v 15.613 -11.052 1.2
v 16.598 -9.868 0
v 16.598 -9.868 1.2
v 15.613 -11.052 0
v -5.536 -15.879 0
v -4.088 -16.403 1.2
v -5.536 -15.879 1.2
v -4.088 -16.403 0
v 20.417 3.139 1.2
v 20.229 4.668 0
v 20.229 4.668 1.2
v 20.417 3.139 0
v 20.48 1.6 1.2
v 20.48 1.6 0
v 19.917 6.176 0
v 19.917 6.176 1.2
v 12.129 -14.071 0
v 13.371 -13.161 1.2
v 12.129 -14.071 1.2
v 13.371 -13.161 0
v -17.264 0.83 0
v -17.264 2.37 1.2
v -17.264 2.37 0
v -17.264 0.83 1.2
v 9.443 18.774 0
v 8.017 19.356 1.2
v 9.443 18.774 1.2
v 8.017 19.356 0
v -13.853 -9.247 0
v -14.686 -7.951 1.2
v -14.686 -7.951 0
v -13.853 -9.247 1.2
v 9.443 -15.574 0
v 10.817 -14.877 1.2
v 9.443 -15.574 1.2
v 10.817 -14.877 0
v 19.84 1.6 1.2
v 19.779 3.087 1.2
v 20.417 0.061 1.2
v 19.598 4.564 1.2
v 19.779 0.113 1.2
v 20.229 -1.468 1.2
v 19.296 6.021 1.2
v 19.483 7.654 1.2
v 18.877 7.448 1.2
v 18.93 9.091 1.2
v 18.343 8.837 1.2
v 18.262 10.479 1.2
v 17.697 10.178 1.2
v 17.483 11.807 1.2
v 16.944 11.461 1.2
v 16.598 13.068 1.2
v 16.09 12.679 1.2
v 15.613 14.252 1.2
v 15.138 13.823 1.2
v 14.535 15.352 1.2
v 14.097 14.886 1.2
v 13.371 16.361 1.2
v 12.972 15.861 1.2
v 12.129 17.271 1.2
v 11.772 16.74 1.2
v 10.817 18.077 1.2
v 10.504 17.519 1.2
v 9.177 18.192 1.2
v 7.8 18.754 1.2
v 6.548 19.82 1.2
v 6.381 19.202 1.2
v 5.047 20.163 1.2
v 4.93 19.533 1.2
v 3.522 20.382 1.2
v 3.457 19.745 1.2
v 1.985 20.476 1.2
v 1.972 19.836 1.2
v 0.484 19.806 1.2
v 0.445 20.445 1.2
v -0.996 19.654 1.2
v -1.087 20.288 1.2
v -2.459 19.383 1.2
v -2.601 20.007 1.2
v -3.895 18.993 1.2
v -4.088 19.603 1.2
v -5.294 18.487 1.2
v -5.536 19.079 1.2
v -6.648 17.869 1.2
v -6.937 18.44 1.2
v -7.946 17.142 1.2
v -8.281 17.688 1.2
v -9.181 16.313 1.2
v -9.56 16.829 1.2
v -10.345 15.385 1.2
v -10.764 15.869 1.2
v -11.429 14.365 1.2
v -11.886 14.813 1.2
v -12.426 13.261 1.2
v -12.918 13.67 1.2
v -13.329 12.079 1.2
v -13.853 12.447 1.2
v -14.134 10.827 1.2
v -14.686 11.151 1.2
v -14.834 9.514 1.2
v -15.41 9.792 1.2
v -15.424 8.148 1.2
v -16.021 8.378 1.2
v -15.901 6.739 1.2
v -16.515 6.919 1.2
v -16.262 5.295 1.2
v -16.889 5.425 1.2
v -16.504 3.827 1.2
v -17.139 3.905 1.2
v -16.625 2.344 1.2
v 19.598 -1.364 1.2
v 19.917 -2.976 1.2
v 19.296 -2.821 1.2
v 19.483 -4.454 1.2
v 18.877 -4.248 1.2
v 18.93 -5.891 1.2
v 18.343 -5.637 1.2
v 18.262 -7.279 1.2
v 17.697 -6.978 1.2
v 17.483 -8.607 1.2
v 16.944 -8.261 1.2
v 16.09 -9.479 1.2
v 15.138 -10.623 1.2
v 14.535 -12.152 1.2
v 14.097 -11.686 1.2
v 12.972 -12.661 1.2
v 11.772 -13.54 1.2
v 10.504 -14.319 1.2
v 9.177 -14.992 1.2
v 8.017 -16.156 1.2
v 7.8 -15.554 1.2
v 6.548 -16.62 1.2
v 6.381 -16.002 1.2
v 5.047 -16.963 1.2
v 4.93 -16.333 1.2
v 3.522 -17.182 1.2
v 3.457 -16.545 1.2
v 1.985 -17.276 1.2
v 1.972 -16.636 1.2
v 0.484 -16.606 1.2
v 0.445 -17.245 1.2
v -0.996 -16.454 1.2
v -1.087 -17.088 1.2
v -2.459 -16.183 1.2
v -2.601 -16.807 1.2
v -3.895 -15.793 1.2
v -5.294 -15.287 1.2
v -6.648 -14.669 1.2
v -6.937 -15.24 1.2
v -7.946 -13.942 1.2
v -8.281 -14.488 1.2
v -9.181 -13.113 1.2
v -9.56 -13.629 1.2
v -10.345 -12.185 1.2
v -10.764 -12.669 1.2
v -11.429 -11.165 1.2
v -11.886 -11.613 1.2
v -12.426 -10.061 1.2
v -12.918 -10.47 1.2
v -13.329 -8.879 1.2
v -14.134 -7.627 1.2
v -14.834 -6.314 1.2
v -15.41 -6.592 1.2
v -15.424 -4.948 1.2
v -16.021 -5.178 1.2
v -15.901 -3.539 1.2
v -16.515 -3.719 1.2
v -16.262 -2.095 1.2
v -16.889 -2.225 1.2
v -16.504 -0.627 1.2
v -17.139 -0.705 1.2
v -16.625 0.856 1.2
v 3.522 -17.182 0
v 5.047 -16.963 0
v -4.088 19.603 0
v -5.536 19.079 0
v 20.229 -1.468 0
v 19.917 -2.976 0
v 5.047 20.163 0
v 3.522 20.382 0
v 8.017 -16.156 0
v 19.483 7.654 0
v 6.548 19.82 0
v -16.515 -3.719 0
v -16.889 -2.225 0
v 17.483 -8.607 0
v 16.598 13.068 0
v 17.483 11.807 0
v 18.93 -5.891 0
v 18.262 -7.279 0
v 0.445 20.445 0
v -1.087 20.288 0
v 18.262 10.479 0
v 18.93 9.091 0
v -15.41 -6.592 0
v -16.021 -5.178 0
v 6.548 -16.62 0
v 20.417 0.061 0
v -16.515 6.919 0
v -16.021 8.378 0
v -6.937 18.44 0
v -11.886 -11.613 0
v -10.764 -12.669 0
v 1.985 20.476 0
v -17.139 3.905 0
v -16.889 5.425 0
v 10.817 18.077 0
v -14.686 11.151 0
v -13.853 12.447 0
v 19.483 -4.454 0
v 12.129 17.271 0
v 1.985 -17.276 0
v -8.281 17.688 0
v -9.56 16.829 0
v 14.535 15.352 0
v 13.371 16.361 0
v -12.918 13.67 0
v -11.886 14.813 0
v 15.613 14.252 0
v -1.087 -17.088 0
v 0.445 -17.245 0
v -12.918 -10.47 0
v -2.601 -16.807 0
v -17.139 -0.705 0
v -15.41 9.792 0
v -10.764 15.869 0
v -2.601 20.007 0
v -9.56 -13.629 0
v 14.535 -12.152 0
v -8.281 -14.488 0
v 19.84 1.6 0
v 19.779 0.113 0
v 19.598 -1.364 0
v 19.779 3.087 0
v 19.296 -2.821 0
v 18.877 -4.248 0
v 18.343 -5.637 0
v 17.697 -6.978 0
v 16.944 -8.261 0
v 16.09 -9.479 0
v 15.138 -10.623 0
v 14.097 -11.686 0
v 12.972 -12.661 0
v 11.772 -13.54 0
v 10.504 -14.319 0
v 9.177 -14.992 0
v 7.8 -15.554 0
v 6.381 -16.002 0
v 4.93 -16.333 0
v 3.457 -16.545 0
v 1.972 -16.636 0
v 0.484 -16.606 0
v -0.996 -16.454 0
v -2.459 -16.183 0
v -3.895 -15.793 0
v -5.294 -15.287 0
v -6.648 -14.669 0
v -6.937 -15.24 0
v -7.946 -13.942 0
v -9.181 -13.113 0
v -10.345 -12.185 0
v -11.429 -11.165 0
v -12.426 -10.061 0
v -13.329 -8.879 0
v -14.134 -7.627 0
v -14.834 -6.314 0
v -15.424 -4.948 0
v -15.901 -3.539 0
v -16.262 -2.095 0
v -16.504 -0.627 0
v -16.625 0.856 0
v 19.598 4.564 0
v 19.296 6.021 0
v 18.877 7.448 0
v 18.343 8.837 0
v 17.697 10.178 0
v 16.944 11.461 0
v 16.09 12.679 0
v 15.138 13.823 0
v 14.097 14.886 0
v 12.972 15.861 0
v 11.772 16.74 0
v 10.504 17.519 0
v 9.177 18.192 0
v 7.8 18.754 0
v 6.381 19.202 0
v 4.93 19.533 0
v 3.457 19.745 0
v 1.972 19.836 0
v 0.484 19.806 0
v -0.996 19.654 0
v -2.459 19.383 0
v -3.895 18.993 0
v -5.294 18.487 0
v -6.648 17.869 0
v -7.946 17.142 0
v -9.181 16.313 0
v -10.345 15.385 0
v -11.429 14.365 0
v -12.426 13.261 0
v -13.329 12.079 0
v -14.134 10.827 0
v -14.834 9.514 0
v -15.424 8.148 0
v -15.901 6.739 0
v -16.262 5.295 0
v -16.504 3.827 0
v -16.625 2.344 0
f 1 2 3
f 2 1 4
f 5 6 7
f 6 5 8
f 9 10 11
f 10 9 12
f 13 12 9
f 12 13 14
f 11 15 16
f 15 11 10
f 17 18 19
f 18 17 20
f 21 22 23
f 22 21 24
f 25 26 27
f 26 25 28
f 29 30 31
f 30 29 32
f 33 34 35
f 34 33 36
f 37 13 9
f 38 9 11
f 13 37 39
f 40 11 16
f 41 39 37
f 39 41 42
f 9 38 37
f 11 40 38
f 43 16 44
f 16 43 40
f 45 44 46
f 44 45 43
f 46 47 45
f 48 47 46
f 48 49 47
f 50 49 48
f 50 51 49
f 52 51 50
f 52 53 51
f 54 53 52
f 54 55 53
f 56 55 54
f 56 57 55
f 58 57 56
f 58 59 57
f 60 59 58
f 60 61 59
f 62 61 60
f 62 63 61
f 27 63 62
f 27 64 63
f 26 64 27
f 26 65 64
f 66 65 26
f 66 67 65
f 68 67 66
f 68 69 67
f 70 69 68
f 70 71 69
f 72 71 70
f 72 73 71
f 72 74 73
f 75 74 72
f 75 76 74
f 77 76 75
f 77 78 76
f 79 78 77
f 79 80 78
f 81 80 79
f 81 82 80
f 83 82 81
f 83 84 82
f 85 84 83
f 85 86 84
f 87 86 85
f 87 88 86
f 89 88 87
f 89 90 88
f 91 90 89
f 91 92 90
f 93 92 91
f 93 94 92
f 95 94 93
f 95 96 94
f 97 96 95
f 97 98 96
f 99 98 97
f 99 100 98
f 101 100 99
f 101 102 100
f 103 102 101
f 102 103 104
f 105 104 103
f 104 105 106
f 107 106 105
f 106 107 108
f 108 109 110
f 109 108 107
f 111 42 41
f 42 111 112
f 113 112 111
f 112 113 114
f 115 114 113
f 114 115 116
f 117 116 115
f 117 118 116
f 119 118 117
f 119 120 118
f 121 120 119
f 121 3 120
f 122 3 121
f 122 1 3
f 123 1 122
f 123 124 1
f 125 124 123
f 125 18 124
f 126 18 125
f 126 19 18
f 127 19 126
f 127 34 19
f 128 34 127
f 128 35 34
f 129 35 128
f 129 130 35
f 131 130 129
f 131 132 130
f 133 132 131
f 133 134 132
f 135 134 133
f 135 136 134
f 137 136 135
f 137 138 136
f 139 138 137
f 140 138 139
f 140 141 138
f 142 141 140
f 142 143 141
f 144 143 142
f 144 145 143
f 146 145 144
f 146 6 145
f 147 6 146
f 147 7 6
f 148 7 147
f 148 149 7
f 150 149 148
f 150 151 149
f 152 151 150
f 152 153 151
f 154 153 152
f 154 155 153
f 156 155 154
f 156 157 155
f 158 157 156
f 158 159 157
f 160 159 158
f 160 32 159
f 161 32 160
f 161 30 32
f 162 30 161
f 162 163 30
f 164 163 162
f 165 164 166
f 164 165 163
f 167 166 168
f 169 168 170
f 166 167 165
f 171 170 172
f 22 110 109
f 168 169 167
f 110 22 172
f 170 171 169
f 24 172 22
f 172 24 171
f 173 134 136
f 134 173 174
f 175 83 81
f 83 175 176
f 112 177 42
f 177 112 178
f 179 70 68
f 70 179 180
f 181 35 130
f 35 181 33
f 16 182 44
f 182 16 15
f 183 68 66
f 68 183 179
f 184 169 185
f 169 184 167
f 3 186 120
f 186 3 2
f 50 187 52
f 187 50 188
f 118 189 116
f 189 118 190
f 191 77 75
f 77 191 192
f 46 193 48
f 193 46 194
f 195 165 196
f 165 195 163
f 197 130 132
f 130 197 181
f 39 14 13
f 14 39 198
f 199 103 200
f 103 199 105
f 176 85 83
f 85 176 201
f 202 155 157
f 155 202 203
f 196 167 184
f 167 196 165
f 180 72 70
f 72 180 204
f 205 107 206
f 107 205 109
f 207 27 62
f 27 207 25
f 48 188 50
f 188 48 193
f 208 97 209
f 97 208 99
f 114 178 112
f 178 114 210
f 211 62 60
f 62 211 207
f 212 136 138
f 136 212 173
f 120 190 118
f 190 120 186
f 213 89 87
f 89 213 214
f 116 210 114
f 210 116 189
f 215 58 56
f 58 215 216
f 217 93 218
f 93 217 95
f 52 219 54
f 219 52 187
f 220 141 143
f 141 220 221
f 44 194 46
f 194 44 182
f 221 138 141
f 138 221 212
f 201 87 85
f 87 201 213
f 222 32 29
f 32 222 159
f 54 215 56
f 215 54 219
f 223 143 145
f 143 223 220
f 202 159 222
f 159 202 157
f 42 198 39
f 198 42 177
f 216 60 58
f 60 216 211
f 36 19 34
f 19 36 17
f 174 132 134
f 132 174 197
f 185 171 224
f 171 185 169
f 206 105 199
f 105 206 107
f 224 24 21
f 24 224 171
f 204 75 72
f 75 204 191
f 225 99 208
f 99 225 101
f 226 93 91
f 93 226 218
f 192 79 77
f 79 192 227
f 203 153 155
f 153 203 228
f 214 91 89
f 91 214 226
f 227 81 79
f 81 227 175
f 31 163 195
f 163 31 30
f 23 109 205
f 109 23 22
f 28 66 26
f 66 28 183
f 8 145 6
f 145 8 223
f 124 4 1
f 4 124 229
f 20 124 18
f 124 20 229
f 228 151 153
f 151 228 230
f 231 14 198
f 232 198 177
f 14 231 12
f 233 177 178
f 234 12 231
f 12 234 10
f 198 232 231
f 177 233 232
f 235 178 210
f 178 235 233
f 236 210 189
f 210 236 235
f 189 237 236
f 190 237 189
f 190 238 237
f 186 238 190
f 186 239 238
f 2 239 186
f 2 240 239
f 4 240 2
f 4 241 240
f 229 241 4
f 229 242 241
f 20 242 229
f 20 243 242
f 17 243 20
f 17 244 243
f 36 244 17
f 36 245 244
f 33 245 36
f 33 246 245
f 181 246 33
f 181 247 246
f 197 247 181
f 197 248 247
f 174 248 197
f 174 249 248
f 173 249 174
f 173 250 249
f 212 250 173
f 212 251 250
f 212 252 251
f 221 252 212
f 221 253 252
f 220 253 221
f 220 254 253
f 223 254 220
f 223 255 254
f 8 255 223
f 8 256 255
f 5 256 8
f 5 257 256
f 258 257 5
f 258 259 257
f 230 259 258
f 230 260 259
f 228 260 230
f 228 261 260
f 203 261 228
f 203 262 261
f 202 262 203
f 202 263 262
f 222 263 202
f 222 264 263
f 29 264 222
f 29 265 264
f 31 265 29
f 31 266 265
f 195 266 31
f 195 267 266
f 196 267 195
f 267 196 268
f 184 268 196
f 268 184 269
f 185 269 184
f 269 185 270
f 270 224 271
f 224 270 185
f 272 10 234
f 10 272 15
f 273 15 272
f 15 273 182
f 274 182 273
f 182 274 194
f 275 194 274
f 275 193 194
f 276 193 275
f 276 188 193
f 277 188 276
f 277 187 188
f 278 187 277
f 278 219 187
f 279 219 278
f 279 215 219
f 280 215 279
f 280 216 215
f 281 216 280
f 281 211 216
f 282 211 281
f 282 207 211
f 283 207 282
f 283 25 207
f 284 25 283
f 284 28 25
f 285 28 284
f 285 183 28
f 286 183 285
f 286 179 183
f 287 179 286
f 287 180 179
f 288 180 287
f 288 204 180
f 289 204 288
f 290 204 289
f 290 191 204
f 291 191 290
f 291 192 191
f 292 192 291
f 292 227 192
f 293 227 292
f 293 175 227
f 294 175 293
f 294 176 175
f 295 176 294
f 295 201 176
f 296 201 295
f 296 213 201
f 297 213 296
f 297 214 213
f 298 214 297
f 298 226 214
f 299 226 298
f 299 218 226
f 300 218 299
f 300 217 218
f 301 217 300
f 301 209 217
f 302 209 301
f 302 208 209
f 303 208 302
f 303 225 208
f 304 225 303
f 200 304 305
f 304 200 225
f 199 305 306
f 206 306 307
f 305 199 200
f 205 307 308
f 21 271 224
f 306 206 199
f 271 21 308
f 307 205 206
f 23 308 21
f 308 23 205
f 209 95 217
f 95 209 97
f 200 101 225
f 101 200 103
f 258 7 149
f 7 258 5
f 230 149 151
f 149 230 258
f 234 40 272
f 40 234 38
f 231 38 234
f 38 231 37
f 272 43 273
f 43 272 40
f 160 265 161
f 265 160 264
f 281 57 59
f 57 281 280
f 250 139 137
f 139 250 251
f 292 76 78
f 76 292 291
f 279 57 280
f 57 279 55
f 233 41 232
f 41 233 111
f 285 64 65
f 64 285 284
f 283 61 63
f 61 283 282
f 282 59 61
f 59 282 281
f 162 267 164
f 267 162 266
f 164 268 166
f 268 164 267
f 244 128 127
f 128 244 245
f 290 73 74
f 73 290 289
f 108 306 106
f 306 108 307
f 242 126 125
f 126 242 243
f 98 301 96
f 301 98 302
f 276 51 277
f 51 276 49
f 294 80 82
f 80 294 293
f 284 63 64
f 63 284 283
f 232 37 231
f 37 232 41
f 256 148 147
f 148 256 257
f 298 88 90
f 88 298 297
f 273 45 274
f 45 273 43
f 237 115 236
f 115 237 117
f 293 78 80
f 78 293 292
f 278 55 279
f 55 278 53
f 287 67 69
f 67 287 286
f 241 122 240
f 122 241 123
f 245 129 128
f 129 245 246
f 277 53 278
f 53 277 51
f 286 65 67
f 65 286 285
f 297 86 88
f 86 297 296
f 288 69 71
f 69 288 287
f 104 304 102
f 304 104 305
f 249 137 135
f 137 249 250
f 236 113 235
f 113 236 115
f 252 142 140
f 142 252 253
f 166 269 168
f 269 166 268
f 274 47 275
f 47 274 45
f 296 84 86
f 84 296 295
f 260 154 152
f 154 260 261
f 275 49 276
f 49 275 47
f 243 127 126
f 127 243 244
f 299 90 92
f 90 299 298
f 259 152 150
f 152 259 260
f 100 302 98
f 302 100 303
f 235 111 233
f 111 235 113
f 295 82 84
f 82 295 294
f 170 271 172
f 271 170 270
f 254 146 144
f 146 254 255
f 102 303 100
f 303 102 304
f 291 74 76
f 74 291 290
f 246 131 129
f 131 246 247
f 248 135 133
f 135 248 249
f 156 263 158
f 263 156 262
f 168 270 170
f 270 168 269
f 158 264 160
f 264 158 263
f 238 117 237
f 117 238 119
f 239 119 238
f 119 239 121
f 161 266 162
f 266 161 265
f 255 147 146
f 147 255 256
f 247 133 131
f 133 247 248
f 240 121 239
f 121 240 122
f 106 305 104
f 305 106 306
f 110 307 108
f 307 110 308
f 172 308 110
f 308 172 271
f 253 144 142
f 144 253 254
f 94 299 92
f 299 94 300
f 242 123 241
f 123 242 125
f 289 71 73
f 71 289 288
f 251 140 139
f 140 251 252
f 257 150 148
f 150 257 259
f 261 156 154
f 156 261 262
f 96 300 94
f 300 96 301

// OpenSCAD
// file: Tull2.scad
module Tull2_1()
{
 /* Generated by trace2scad version 20150415
    http://aggregate.org/MAKE/TRACE2SCAD/
    Optimized model has 507/1073 original points
 */
 color([0.5, 0.5, 0.5])
 assign(minx=0) /* polygon minx=774 */
 assign(miny=0) /* polygon miny=345 */
 assign(maxx=8590) /* polygon maxx=8136 */
 assign(maxy=8550) /* polygon maxy=4995 */
 assign(dx=maxx-minx)
 assign(dy=maxy-miny)
 assign(maxd=((dx>dy)?dx:dy))
 scale([1/maxd, 1/maxd, 1])
 translate([-minx-dx/2, -miny-dy/2, 0])
 linear_extrude(height=1, convexity=507)
 union() {
  union() {
   polygon([[7190,4966],[7190,4938],[7199,4823],[7206,4806],[7233,4795],[7633,4703],[7647,4690],[7637,4674],[7282,4489],[7241,4469],[7236,4457],[7250,4340],[7256,4283],[7261,4275],[7888,4625],[7914,4625],[7957,4610],[7981,4588],[7996,4559],[8013,4458],[8058,4459],[8133,4468],[8136,4518],[8119,4628],[8094,4689],[8043,4741],[7963,4779],[7197,4995],[7190,4995]], convexity=9);
   union() {
    difference() {
     polygon([[7560,4212],[7523,4205],[7448,4179],[7398,4146],[7295,4043],[7270,4008],[7251,3957],[7235,3880],[7235,3793],[7245,3728],[7280,3653],[7326,3598],[7378,3559],[7440,3529],[7513,3509],[7634,3504],[7688,3516],[7768,3556],[7833,3624],[7874,3703],[7896,3768],[7911,3843],[7919,3993],[7901,4103],[7885,4153],[7858,4208],[7823,4211],[7720,4199],[7720,4191],[7765,4112],[7790,4013],[7785,3871],[7770,3810],[7750,3765],[7709,3720],[7657,3701],[7612,3694],[7595,3711],[7625,4103],[7630,4158],[7630,4220],[7598,4219]], convexity=12);
     polygon([[7525,3998],[7530,3991],[7485,3743],[7471,3729],[7447,3735],[7406,3764],[7380,3798],[7365,3860],[7376,3922],[7394,3958],[7428,3990],[7468,4004],[7519,4005]], convexity=6);
    }
   }
   polygon([[1434,4182],[1400,4175],[1330,4139],[1277,4086],[1245,4020],[1230,3972],[1216,3893],[1205,3743],[1195,3658],[1180,3611],[1144,3575],[1094,3559],[1053,3566],[1012,3589],[985,3628],[966,3673],[950,3763],[950,3908],[960,3978],[989,4092],[991,4106],[948,4102],[813,4079],[795,4062],[785,3993],[774,3828],[786,3688],[817,3553],[861,3449],[921,3355],[978,3303],[1038,3273],[1124,3269],[1181,3281],[1278,3329],[1333,3385],[1379,3468],[1401,3533],[1410,3583],[1420,3668],[1430,3853],[1450,3919],[1477,3951],[1510,3965],[1572,3965],[1613,3941],[1635,3911],[1661,3853],[1675,3758],[1674,3633],[1659,3540],[1674,3540],[1788,3581],[1828,3591],[1843,3599],[1848,3678],[1840,3825],[1814,3951],[1784,4031],[1735,4105],[1684,4149],[1628,4177],[1578,4190],[1468,4189]], convexity=13);
   polygon([[7179,3501],[7176,3498],[7144,3302],[7306,3057],[7320,3036],[7320,3029],[7298,3036],[7258,3055],[7241,3055],[7234,3065],[7213,3065],[7158,3084],[7113,3097],[7046,3130],[7026,3134],[6995,3150],[6975,3150],[6935,3170],[6887,3170],[6839,3146],[6809,3118],[6780,3060],[6780,3019],[6806,2973],[6836,2941],[6965,2875],[6995,2875],[7048,2848],[7061,2851],[7079,2834],[7123,2829],[7160,2810],[7189,2810],[7266,2770],[7298,2770],[7370,2735],[7399,2735],[7438,2716],[7478,2699],[7590,2634],[7603,2639],[7705,2889],[7705,2909],[7640,2928],[7593,2941],[7513,2969],[7469,2981],[7463,2997],[7474,3000],[7779,3200],[7786,3253],[7815,3412],[7806,3421],[7448,3180],[7419,3164],[7404,3177],[7196,3493],[7181,3505]], convexity=23);
   polygon([[1617,3321],[1576,3303],[1530,3284],[1525,3266],[1543,3228],[1562,3175],[1552,3158],[1528,3145],[1225,3014],[1150,2964],[1114,2923],[1094,2880],[1089,2811],[1106,2738],[1189,2534],[1206,2509],[1223,2514],[1338,2561],[1356,2578],[1305,2706],[1299,2763],[1319,2794],[1366,2821],[1434,2849],[1637,2940],[1664,2940],[1673,2928],[1761,2720],[1778,2720],[1911,2777],[1916,2790],[1830,2995],[1830,3019],[1851,3034],[1998,3096],[2016,3112],[2010,3142],[1938,3303],[1929,3315],[1912,3315],[1763,3249],[1738,3240],[1717,3254],[1679,3340],[1658,3339]], convexity=17);
   polygon([[6946,2688],[6920,2680],[6888,2664],[6832,2608],[6788,2520],[6784,2419],[6802,2340],[6791,2329],[6720,2365],[6707,2346],[6638,2200],[6653,2186],[7189,1890],[7201,1890],[7280,2056],[7280,2069],[7248,2089],[7033,2201],[6963,2242],[6911,2290],[6884,2352],[6889,2409],[6918,2462],[6963,2491],[7023,2487],[7133,2431],[7383,2292],[7398,2286],[7409,2293],[7491,2440],[7488,2456],[7198,2620],[7092,2674],[7040,2689],[6973,2695]], convexity=14);
   union() {
    difference() {
     polygon([[1790,2582],[1778,2579],[1688,2554],[1628,2524],[1547,2470],[1482,2402],[1451,2348],[1425,2269],[1425,2166],[1440,2093],[1467,2023],[1506,1948],[1550,1881],[1622,1804],[1738,1717],[1799,1680],[1821,1680],[1929,1758],[1935,1771],[1929,1780],[1870,1810],[1768,1876],[1689,1953],[1646,2018],[1619,2078],[1614,2170],[1645,2234],[1686,2271],[1703,2268],[1780,2163],[2033,1808],[2049,1798],[2098,1832],[2162,1887],[2215,1952],[2254,2033],[2271,2106],[2264,2192],[2255,2242],[2230,2305],[2208,2343],[2148,2428],[2068,2508],[1998,2549],[1938,2571],[1858,2585],[1803,2584]], convexity=11);
     polygon([[1983,2355],[2015,2340],[2059,2289],[2081,2244],[2082,2158],[2055,2106],[2024,2080],[2006,2080],[1825,2333],[1825,2349],[1839,2360],[1878,2375],[1951,2371]], convexity=7);
    }
   }
   union() {
    difference() {
     polygon([[6588,1945],[6563,1941],[6484,1909],[6409,1848],[6335,1753],[6296,1673],[6280,1613],[6274,1523],[6291,1458],[6332,1383],[6428,1287],[6500,1244],[6578,1219],[6668,1219],[6727,1240],[6773,1267],[6828,1309],[6896,1381],[6941,1450],[6970,1513],[6991,1596],[6987,1703],[6946,1788],[6889,1850],[6801,1909],[6722,1940],[6658,1950],[6613,1949]], convexity=7);
     polygon([[6651,1748],[6683,1737],[6754,1690],[6796,1644],[6817,1598],[6817,1533],[6794,1485],[6750,1436],[6694,1410],[6627,1408],[6558,1442],[6486,1514],[6453,1582],[6453,1658],[6477,1706],[6524,1748],[6558,1759],[6620,1760]], convexity=6);
    }
   }
   union() {
    difference() {
     polygon([[2510,1823],[2508,1821],[2394,1810],[2303,1780],[2223,1735],[2153,1681],[2116,1643],[2081,1591],[2055,1524],[2049,1412],[2134,1240],[2181,1170],[2248,1102],[2320,1045],[2398,998],[2525,940],[2563,934],[2661,1040],[2658,1056],[2553,1088],[2474,1125],[2392,1179],[2325,1247],[2289,1321],[2294,1399],[2315,1447],[2332,1465],[2350,1465],[2755,1100],[2767,1100],[2825,1163],[2876,1235],[2904,1298],[2920,1364],[2922,1458],[2898,1543],[2871,1598],[2823,1662],[2773,1711],[2703,1764],[2638,1799],[2561,1825],[2512,1825]], convexity=10);
     polygon([[2622,1626],[2655,1611],[2704,1561],[2726,1519],[2731,1453],[2710,1396],[2685,1370],[2665,1370],[2443,1565],[2433,1590],[2458,1616],[2515,1640],[2528,1645],[2589,1641]], convexity=7);
    }
   }
   polygon([[3067,1127],[2753,708],[2753,684],[2888,585],[2940,549],[2955,561],[3386,1178],[3544,1403],[3556,1426],[3543,1441],[3399,1545],[3382,1545]], convexity=6);
   polygon([[5851,1511],[5832,1488],[5790,1430],[5790,1407],[5848,997],[5856,946],[5849,934],[5827,938],[5446,1205],[5427,1205],[5273,1109],[5229,1083],[5198,1057],[5483,618],[5513,573],[5518,563],[5660,345],[5667,345],[5805,431],[5821,449],[5765,540],[5755,558],[5715,620],[5630,758],[5565,860],[5555,878],[5525,923],[5500,970],[5514,976],[5536,964],[5902,709],[5919,704],[6012,761],[6026,771],[6021,793],[5966,978],[5909,1183],[5904,1224],[5914,1230],[5948,1203],[6380,830],[6395,838],[6505,963],[6505,980],[5878,1531],[5871,1535]], convexity=18);
  }
 }
}

module Tull2()
{
 /* all layers combined, scaled to within a 1mm cube */
 scale([1, 1, 1/1])
 difference() {
  union() {
   scale([1,1,2]) translate([0,0,-0.5]) Tull2_1();
  }
  translate([0,0,-2]) cube([2,2,4],center=true);
 }
}
// file: Tull1.scad
module Tull1_1()
{
 /* Generated by trace2scad version 20150415
    http://aggregate.org/MAKE/TRACE2SCAD/
    Optimized model has 495/1015 original points
 */
 color([0.5, 0.5, 0.5])
 assign(minx=0) /* polygon minx=51 */
 assign(miny=0) /* polygon miny=53 */
 assign(maxx=3720) /* polygon maxx=3664 */
 assign(maxy=6950) /* polygon maxy=6894 */
 assign(dx=maxx-minx)
 assign(dy=maxy-miny)
 assign(maxd=((dx>dy)?dx:dy))
 scale([1/maxd, 1/maxd, 1])
 translate([-minx-dx/2, -miny-dy/2, 0])
 linear_extrude(height=1, convexity=495)
 union() {
  union() {
   union() {
    difference() {
     polygon([[2397,6890],[2376,6886],[2335,6865],[2288,6865],[2243,6854],[2210,6829],[2138,6805],[2111,6775],[2060,6767],[2046,6755],[2040,6729],[2005,6715],[1961,6715],[1935,6689],[1935,6680],[1910,6664],[1838,6645],[1806,6645],[1776,6617],[1765,6565],[1765,6530],[1754,6530],[1716,6573],[1683,6555],[1650,6505],[1626,6495],[1610,6472],[1616,6450],[1661,6424],[1631,6393],[1621,6373],[1614,6324],[1598,6328],[1604,6366],[1606,6390],[1590,6415],[1561,6415],[1555,6399],[1555,6382],[1541,6363],[1508,6394],[1486,6405],[1470,6405],[1470,6376],[1504,6332],[1530,6315],[1530,6301],[1505,6275],[1525,6233],[1525,6230],[1511,6230],[1494,6256],[1457,6215],[1430,6215],[1405,6190],[1405,6160],[1378,6149],[1298,6156],[1271,6135],[1265,6101],[1251,6090],[1198,6084],[1175,6070],[1175,6041],[1194,6018],[1238,6034],[1273,6039],[1320,6060],[1320,6083],[1334,6102],[1350,6089],[1395,6095],[1395,6089],[1384,6069],[1396,6055],[1423,6055],[1463,6095],[1516,6111],[1531,6096],[1525,6086],[1487,6091],[1450,6076],[1428,6030],[1411,6030],[1386,6050],[1339,6050],[1298,6038],[1263,6002],[1204,5964],[1179,5935],[1160,5925],[1120,5936],[1063,5921],[1003,5914],[959,5899],[946,5904],[929,5940],[883,5980],[830,5996],[784,6035],[759,6035],[725,5999],[675,6005],[634,6020],[577,6020],[558,6000],[545,6000],[536,6018],[509,6113],[486,6158],[421,6200],[391,6200],[374,6183],[380,6148],[423,6064],[454,6027],[461,6001],[480,5984],[489,5953],[501,5846],[495,5821],[478,5814],[258,5805],[166,5790],[124,5784],[71,5765],[56,5748],[51,5724],[66,5663],[78,5655],[139,5655],[223,5674],[373,5698],[428,5698],[422,5658],[420,5638],[441,5601],[447,5589],[410,5458],[384,5420],[389,5374],[428,5318],[435,5293],[481,5240],[557,5195],[571,5195],[601,5170],[632,5170],[683,5199],[768,5224],[834,5235],[1003,5245],[1145,5245],[1238,5276],[1323,5281],[1353,5261],[1431,5048],[1440,4908],[1440,4820],[1420,4729],[1401,4673],[1390,4518],[1379,4428],[1350,4354],[1336,4338],[1302,4262],[1261,4203],[1206,4088],[1190,4023],[1170,3963],[1130,3946],[1115,3909],[1121,3889],[1218,3910],[1274,3916],[1280,3896],[1249,3813],[1235,3792],[1215,3733],[1194,3653],[1121,3493],[1070,3391],[1039,3318],[1015,3243],[999,3088],[1005,2983],[1024,2843],[1031,2753],[1020,2670],[988,2613],[931,2532],[858,2476],[775,2391],[754,2343],[737,2323],[704,2248],[690,2195],[690,2033],[679,1963],[680,1920],[700,1863],[700,1820],[714,1785],[740,1779],[766,1785],[780,1819],[801,1962],[825,2005],[863,2032],[910,2075],[939,2075],[1055,2098],[1103,2106],[1218,2146],[1314,2244],[1335,2290],[1349,2358],[1365,2455],[1365,2516],[1382,2545],[1413,2559],[1453,2572],[1478,2587],[1505,2612],[1505,2652],[1488,2740],[1511,2778],[1589,2933],[1612,2997],[1612,3203],[1595,3265],[1559,3358],[1554,3418],[1565,3440],[1575,3440],[1586,3419],[1640,3263],[1640,3020],[1680,2718],[1696,2646],[1662,2602],[1649,2570],[1679,2486],[1700,2333],[1725,2245],[1725,2219],[1694,2123],[1699,1948],[1720,1891],[1742,1864],[1786,1845],[1782,1840],[1734,1815],[1680,1768],[1665,1736],[1665,1694],[1709,1649],[1752,1653],[1770,1678],[1776,1704],[1750,1721],[1720,1711],[1714,1720],[1735,1753],[1755,1772],[1799,1773],[1811,1761],[1789,1718],[1774,1658],[1776,1613],[1787,1599],[1827,1603],[1840,1578],[1840,1491],[1880,1328],[1880,1283],[1895,1218],[1904,1058],[1929,958],[1950,833],[1960,743],[1966,552],[1940,493],[1910,413],[1875,356],[1862,333],[1821,313],[1802,295],[1753,274],[1687,231],[1670,196],[1670,143],[1708,108],[1818,53],[1933,55],[2043,65],[2095,77],[2141,54],[2193,59],[2270,96],[2315,146],[2315,294],[2346,372],[2351,493],[2330,579],[2341,648],[2335,863],[2319,918],[2312,959],[2319,1013],[2320,1440],[2331,1593],[2335,1597],[2353,1585],[2393,1565],[2408,1565],[2446,1593],[2477,1623],[2496,1666],[2479,1743],[2453,1808],[2454,1928],[2499,2138],[2525,2233],[2556,2318],[2582,2373],[2600,2441],[2629,2493],[2665,2527],[2665,2538],[2717,2613],[2723,2618],[2770,2680],[2783,2698],[2783,2742],[2815,2750],[2829,2773],[2835,2808],[2851,2830],[2881,2830],[2899,2840],[2945,2909],[2960,2921],[2954,2975],[3003,2975],[3027,2992],[3019,2973],[3014,2921],[3026,2883],[3073,2805],[3086,2800],[3100,2811],[3100,2841],[3081,2868],[3070,2908],[3070,2940],[3086,2985],[3070,3050],[3094,3050],[3109,3035],[3121,2979],[3105,2937],[3105,2914],[3115,2895],[3139,2895],[3159,2920],[3170,2994],[3163,3090],[3203,3106],[3221,3123],[3288,3220],[3311,3252],[3383,3338],[3428,3396],[3503,3505],[3532,3564],[3553,3570],[3615,3620],[3655,3680],[3664,3703],[3645,3763],[3639,3848],[3610,3920],[3578,3960],[3533,3990],[3470,4010],[3383,4026],[3248,4065],[3203,4079],[3083,4109],[2945,4130],[2844,4170],[2808,4176],[2768,4190],[2703,4200],[2690,4217],[2696,4258],[2715,4310],[2715,4363],[2699,4403],[2684,4448],[2683,4537],[2714,4563],[2741,4581],[2756,4618],[2764,4898],[2778,4937],[2794,4947],[2814,4930],[2883,4915],[2950,4915],[3028,4940],[3043,4940],[3100,4980],[3126,5025],[3135,5091],[3152,5123],[3150,5213],[3135,5286],[3124,5433],[3110,5533],[3091,5598],[3071,5648],[3055,5783],[3035,5846],[3035,5875],[2994,5964],[2970,5975],[2879,5982],[2885,6030],[2860,6059],[2860,6066],[2890,6100],[2890,6135],[2906,6167],[2915,6283],[2890,6330],[2890,6450],[2876,6483],[2830,6542],[2809,6611],[2793,6638],[2690,6773],[2610,6811],[2547,6819],[2526,6830],[2484,6865],[2443,6889],[2418,6894]], convexity=143);
     polygon([[1223,5812],[1226,5804],[1213,5791],[1141,5751],[1083,5736],[983,5730],[894,5719],[883,5730],[913,5763],[930,5790],[959,5805],[1168,5817],[1173,5819],[1220,5820]], convexity=6);
     polygon([[2657,3453],[2659,3448],[2691,3310],[2623,3208],[2561,3108],[2533,3069],[2504,3018],[2472,2948],[2446,2903],[2431,2848],[2424,2801],[2371,2725],[2331,2671],[2323,2659],[2318,2598],[2301,2595],[2294,2613],[2286,2779],[2264,2809],[2285,2878],[2295,3033],[2310,3173],[2320,3238],[2327,3410],[2314,3434],[2320,3451],[2428,3425],[2463,3425],[2543,3445],[2588,3459],[2613,3463],[2656,3459]], convexity=11);
    }
   }
  }
 }
}

module Tull1()
{
 /* all layers combined, scaled to within a 1mm cube */
 scale([1, 1, 1/1])
 difference() {
  union() {
   scale([1,1,2]) translate([0,0,-0.5]) Tull1_1();
  }
  translate([0,0,-2]) cube([2,2,4],center=true);
 }
}
// main file
//====================================================================
// SteelMonkey.scad
//
// Steel Monkey band logo for coins or disks
// 
// DrTomFlint 23 March 2024
//====================================================================


use <./Tull1.scad>
use <./Tull2.scad>

layer = 0.3;
//~ thick = 7*layer;    // thickness not including top and bottom
thick = 4*layer;    // thickness not including top and bottom

mag=32;   // scaling
R0=2;     // rounding of corners
F1=77;

//------------------------------------------------------------
module SteelYellowX(){
  
  scale([mag,mag,thick])
  Tull1();
  
  difference(){
    translate([0.05*mag,0.05*mag,0])
    cylinder(r=0.57*mag,h=thick,$fn=F1);
    translate([0.05*mag,0.05*mag,-0.5*thick])
    scale([0.9,1,1])
    cylinder(r=0.55*mag,h=2*thick,$fn=F1);
  }

}

//------------------------------------------------------------
module SteelText(){
  
  translate([0.05*mag,0,0])
  scale([mag,mag,thick])
  Tull2();
  
}

//---------------------------------------------------------------
module SteelBlue(){

  difference(){
    translate([0.05*mag,0.05*mag,0])
    scale([0.9,1,1])
    cylinder(r=0.55*mag,h=thick,$fn=F1);
    translate([0,0,-0.5*thick])
    scale([mag,mag,2*thick])
    Tull1();

    translate([0.05*mag,0.55*mag,-0.5*thick])
    cylinder(r=0.5,h=2*thick,$fn=F1);

    translate([0.05*mag,0,-0.5*thick])
    scale([mag,mag,2*thick])
    Tull2();
  }
}

//------------------------------------------------------------
module SteelYellow(){
  
  difference(){
    SteelYellowX();

    translate([0,0,-9.25])
    rotate([-2,0,0])
    cube([2*mag,2*mag,20],center=true);
  }
  
}

//------------------------------------------------------------
module SteelOrange(){
  
  intersection(){
    SteelYellowX();

    translate([0,0,-9.25])
    rotate([-2,0,0])
    cube([2*mag,2*mag,20],center=true);
  }
  
}

//------------------------------------------------------------
module SteelRim(){

  difference(){
    translate([0.05*mag,0.05*mag,0])
    cylinder(r=0.59*mag,h=thick,$fn=F1);
    translate([0.05*mag,0.05*mag,-0.5*thick])
    cylinder(r=0.57*mag,h=2*thick,$fn=F1);
  }
}



//=====================================================================

//~ SteelYellow();
//~ SteelOrange();

SteelRim();

//~ SteelBlue();
//~ SteelText();

//=====================================================================
